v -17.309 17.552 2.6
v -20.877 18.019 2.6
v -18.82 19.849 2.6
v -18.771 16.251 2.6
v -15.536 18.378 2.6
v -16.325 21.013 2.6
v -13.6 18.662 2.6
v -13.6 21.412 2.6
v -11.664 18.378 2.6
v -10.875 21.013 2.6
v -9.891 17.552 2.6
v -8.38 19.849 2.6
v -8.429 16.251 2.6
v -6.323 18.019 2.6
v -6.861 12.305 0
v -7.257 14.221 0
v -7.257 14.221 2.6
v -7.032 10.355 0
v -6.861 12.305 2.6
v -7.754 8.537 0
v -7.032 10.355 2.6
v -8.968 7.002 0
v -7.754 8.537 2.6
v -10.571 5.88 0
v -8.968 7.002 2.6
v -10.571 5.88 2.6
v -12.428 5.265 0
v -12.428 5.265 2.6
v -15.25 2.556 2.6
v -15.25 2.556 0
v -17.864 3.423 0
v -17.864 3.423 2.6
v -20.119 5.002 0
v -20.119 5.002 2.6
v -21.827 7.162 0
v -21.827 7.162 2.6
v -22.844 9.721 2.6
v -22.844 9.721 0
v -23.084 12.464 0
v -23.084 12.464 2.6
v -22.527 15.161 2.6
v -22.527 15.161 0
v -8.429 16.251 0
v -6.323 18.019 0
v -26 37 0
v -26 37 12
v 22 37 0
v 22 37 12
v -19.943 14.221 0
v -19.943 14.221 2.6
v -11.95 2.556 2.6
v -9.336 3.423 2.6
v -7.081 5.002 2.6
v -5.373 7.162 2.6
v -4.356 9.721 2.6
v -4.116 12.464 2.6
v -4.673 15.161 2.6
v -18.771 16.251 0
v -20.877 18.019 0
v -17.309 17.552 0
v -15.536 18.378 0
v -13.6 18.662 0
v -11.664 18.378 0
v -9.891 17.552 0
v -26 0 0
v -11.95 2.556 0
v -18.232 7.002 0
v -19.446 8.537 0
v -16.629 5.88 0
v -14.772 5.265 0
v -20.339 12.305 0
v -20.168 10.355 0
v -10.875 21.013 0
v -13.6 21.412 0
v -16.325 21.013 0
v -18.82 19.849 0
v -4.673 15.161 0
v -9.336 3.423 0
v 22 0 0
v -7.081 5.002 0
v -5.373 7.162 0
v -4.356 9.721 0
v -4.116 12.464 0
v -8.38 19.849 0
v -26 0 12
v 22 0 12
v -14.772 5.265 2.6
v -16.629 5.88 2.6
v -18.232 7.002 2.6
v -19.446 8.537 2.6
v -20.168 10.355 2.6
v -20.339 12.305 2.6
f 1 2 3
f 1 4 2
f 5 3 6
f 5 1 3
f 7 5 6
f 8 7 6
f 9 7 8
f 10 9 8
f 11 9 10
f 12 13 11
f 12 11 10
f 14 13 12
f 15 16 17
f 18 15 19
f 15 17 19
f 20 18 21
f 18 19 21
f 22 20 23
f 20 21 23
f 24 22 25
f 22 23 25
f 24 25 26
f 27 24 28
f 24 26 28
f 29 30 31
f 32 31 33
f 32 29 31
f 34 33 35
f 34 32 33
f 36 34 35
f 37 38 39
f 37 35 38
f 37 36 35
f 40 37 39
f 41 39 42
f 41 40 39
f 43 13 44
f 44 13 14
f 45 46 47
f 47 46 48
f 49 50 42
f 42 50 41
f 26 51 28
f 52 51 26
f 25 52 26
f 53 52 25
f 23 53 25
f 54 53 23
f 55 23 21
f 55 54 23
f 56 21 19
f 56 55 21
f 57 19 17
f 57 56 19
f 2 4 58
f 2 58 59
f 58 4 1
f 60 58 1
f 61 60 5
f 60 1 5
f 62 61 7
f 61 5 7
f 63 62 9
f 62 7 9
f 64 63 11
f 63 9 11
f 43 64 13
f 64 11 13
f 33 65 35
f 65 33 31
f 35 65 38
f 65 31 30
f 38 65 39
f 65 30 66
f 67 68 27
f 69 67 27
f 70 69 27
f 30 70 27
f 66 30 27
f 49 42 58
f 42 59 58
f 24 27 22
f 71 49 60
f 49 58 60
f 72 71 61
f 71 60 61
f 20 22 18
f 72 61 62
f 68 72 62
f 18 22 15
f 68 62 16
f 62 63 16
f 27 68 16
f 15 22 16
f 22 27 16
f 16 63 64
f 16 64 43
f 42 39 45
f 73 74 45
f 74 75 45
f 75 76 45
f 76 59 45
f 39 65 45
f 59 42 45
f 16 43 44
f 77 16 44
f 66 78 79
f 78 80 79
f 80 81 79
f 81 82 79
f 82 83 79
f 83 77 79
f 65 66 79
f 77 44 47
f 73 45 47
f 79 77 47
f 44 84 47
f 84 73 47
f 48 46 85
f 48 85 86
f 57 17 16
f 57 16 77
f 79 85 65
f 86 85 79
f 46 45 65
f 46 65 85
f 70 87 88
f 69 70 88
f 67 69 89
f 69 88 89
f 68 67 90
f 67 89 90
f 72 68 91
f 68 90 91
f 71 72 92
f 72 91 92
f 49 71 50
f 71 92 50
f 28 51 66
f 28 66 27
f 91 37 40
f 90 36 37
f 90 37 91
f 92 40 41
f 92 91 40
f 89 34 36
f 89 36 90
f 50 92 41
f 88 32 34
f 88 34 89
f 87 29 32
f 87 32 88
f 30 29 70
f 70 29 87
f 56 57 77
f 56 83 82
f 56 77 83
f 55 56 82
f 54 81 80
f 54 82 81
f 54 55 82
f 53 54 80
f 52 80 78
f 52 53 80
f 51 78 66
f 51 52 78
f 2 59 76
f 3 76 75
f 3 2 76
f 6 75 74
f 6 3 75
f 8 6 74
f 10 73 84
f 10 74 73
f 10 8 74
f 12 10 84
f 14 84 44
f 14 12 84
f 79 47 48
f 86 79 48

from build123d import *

# Parameters (mm, degrees)
EXTRUDE010_DEPTH           = 20
EXTRUDE010_PLACEMENT_ANGLE = 300
BOX140_W                   = 48
BOX140_H                   = 12
BOX140_DEPTH               = 37
CUT028_PLACEMENT_ANGLE     = 90


with BuildPart() as extrude010:
    # Sketch021 (on Box) → Extrude010 (new body)
    with BuildSketch(Plane.XZ):
        with BuildLine():
            ThreePointArc((7.277422, 6.106482), (0, 9.5), (-7.277422, 6.106482))
            Line((-7.277422, 6.106482), (-5.1708, 4.338816))
            ThreePointArc((5.1708, 4.338816), (0, 6.75), (-5.1708, 4.338816))
            Line((5.1708, 4.338816), (7.277422, 6.106482))
        make_face()
        with BuildLine():
            ThreePointArc((-8.92708, 3.249192), (-8.227241, -4.75), (-1.649658, -9.355674))
            Line((-1.172125, -6.647452), (-1.649658, -9.355674))
            ThreePointArc((-6.342925, 2.308636), (-5.845671, -3.375), (-1.172125, -6.647452))
            Line((-8.92708, 3.249192), (-6.342925, 2.308636))
        make_face()
        with BuildLine():
            ThreePointArc((1.649658, -9.355674), (8.227241, -4.75), (8.92708, 3.249192))
            Line((6.342925, 2.308636), (8.92708, 3.249192))
            ThreePointArc((1.172125, -6.647452), (5.845671, -3.375), (6.342925, 2.308636))
            Line((1.172125, -6.647452), (1.649658, -9.355674))
        make_face()
    extrude(amount=EXTRUDE010_DEPTH)


with BuildPart() as extrude010_1:
    # Extrude010 placement: moved
    add(extrude010.part.moved(Location((12.4, 2.6, 25.087942))).rotate(Axis((12.4, 2.6, 25.087942), (0, -1, 0)), EXTRUDE010_PLACEMENT_ANGLE))


with BuildPart() as cut028:
    # Box140 → Box140 (new body)
    with BuildSketch(Plane.XY):
        with Locations((24, 6)):
            Rectangle(BOX140_W, BOX140_H)
    extrude(amount=BOX140_DEPTH)

    # Cut028: cut Extrude010
    add(extrude010_1.part, mode=Mode.SUBTRACT)


with BuildPart() as cut028_1:
    # Cut028 placement: moved
    add(cut028.part.moved(Location((-26, 37, 0))).rotate(Axis((-26, 37, 0), (1, 0, 0)), CUT028_PLACEMENT_ANGLE))


solid = cut028_1.part
